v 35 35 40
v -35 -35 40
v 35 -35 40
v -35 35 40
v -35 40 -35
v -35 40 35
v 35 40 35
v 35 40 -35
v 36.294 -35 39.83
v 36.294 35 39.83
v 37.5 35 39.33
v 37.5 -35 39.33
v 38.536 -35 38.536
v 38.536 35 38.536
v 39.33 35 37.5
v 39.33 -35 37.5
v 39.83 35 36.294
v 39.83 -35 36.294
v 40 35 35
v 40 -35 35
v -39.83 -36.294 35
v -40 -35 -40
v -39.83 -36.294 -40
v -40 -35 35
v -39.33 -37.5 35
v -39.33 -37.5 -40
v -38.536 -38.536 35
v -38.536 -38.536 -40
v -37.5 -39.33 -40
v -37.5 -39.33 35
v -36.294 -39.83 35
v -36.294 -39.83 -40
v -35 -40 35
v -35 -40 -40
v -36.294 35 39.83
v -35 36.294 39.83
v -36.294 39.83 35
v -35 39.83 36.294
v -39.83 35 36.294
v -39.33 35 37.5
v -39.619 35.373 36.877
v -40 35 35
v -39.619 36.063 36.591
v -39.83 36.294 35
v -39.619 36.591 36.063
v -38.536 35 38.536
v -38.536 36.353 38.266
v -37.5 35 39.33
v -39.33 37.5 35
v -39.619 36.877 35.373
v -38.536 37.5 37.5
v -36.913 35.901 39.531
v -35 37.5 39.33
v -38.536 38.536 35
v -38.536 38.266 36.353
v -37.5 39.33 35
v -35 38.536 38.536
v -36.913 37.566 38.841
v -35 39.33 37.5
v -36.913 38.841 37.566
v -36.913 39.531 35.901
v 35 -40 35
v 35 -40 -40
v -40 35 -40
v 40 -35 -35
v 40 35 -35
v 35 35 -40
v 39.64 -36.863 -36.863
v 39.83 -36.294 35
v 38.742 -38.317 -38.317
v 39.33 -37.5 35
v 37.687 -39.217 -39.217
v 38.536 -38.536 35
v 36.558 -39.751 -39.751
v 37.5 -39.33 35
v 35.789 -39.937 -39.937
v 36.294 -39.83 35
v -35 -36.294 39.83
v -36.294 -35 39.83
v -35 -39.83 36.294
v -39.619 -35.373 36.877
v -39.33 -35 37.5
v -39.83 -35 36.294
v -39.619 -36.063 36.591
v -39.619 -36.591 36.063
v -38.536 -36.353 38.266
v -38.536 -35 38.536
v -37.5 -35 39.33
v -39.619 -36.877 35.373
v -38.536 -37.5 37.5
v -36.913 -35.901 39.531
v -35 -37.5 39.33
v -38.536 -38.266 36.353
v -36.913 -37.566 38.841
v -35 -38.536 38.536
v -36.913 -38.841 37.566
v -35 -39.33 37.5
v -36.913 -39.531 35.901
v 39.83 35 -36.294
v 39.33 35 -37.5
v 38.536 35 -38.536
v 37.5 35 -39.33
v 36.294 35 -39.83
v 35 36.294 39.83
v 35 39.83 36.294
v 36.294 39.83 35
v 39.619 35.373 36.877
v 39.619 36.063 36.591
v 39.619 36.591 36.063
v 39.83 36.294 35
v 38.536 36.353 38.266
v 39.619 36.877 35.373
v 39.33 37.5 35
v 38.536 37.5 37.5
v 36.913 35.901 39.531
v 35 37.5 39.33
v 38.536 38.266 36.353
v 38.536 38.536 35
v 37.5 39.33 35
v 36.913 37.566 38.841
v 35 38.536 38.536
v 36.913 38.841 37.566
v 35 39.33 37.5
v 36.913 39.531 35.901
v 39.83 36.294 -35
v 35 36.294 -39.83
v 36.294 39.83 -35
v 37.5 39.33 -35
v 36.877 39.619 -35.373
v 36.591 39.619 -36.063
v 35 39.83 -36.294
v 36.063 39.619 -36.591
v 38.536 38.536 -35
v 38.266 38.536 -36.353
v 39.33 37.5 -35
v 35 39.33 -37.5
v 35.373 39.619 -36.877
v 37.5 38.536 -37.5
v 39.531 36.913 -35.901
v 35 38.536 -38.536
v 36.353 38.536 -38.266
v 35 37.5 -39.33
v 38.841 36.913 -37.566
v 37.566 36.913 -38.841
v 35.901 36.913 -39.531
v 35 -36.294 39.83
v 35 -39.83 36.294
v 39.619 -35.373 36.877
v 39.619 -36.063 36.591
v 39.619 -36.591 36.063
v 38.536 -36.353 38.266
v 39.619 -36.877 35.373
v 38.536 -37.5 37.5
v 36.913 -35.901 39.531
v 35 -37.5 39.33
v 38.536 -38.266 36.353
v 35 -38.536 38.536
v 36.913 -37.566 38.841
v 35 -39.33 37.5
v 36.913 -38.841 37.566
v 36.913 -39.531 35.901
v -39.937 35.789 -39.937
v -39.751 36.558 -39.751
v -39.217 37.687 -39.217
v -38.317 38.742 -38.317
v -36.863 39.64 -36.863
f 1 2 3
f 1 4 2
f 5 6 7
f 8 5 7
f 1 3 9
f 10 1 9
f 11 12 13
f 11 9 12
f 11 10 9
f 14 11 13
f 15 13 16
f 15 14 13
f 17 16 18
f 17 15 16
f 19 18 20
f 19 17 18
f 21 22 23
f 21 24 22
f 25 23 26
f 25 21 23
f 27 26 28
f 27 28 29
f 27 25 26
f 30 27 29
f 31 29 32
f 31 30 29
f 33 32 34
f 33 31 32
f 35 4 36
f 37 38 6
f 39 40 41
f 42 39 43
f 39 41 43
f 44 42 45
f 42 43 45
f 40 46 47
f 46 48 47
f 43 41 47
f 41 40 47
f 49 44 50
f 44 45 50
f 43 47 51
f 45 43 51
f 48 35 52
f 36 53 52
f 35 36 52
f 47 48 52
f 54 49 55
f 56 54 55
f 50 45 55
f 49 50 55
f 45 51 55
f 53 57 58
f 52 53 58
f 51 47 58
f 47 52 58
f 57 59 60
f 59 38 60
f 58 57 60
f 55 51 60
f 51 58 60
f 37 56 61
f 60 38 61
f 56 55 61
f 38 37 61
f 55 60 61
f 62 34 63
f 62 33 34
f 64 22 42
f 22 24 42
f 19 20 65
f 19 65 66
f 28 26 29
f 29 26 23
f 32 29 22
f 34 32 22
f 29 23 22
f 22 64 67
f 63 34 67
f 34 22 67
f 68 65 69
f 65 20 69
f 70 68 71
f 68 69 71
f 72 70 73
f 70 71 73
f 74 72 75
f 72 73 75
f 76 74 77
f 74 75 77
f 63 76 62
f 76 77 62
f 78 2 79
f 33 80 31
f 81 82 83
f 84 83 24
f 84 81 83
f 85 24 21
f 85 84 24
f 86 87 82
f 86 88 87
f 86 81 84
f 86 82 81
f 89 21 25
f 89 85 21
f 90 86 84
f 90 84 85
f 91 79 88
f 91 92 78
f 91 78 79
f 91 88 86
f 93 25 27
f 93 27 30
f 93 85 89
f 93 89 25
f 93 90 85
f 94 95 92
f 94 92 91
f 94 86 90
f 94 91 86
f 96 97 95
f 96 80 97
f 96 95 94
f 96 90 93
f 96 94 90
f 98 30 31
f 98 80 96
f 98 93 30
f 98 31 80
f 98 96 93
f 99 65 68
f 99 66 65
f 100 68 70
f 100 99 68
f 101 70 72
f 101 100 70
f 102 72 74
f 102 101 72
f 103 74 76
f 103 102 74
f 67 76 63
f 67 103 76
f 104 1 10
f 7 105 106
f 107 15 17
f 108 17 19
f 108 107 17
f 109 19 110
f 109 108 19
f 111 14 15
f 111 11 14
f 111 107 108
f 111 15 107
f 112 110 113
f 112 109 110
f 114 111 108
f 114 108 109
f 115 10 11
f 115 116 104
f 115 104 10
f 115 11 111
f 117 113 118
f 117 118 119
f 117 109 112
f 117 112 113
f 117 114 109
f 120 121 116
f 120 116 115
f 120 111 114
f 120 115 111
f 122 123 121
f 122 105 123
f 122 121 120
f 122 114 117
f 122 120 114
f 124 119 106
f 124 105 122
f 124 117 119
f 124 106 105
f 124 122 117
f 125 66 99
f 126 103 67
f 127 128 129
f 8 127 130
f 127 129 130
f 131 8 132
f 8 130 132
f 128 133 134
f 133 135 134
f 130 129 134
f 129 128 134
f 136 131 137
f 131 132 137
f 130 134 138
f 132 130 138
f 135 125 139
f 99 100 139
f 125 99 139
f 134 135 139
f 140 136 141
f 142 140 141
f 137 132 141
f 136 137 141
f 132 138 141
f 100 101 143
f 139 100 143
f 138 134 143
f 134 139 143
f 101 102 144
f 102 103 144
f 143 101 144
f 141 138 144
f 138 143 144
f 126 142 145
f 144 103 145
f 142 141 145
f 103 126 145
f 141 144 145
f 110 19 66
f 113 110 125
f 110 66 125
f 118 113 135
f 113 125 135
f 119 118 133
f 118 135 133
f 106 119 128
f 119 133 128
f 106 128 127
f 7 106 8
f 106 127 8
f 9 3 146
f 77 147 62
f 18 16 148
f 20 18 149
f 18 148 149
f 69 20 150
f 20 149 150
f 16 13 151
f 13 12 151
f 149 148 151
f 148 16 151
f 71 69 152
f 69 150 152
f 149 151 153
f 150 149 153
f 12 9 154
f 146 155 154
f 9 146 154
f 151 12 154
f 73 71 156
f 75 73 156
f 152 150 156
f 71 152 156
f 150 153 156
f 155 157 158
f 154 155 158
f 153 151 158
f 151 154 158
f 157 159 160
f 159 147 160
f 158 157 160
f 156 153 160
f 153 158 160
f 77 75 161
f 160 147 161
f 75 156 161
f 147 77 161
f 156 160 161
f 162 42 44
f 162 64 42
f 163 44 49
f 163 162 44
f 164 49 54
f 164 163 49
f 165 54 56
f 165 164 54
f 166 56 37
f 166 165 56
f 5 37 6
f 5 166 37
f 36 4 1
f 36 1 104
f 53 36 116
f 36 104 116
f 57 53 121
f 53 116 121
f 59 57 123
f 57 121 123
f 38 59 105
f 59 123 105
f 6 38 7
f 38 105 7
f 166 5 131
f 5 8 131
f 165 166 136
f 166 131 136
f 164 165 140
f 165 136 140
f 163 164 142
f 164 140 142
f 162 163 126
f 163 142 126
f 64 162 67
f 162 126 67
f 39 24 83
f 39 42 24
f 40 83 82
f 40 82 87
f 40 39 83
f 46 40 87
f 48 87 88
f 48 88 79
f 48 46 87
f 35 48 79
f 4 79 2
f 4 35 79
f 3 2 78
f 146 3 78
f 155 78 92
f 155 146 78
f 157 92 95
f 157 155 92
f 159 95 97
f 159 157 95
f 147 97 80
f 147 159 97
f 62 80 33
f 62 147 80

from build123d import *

# Parameters (mm, degrees)
F0_W     = 80
F0_H     = 80
F1_DEPTH = 40
F2_R     = 5


with BuildPart() as f1:
    # F0 (on Top) → F1 (new body, symmetric)
    with BuildSketch(Plane.XY):
        Rectangle(F0_W, F0_H)
    extrude(amount=F1_DEPTH, both=True)

    # F2
    f2_edges = [f1.edges().sort_by_distance(p)[0] for p in [
        (0, -40, 40),
        (0, 40, 40),
        (-40, 0, 40),
        (40, 0, 40),
        (40, 0, -40),
        (40, 40, 0),
        (40, -40, 0),
        (0, 40, -40),
        (-40, 40, 0),
        (-40, -40, 0),
    ]]
    fillet(f2_edges, radius=F2_R)


solid = f1.part
